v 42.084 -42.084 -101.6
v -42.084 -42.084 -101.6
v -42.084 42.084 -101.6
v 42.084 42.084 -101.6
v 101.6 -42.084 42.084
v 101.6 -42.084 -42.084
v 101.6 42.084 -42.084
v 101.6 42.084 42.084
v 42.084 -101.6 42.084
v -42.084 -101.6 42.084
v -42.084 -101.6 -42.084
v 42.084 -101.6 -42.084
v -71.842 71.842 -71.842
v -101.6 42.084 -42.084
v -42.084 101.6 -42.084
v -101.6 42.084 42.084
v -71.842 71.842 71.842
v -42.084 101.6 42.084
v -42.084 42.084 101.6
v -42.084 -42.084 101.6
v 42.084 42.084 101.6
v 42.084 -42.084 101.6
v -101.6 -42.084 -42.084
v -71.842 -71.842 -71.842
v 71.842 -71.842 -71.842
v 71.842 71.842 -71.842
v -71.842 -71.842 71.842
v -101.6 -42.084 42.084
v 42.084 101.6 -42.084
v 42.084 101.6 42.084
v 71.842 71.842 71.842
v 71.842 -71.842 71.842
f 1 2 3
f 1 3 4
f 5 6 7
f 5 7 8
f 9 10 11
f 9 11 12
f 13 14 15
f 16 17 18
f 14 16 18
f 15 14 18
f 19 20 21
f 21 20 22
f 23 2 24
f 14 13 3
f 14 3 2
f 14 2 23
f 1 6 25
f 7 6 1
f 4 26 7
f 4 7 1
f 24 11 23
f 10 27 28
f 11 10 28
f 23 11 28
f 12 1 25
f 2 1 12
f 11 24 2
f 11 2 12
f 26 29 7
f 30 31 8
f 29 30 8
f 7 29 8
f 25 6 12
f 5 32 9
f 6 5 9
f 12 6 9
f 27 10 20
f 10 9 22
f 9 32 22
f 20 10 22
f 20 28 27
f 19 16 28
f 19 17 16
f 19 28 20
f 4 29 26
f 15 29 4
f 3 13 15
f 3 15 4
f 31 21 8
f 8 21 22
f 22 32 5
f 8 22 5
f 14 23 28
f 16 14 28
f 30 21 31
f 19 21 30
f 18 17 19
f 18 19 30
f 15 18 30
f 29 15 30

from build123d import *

# Parameters (mm, degrees)
F0_W     = 203.2
F0_H     = 203.2
F1_DEPTH = 101.6
F3_DEPTH = 203.2
F5_DEPTH = 101.6
F7_DEPTH = 101.6


with BuildPart() as f1:
    # F0 (on Front) → F1 (new body, symmetric)
    with BuildSketch(Plane.XZ):
        Rectangle(F0_W, F0_H)
    extrude(amount=F1_DEPTH, both=True)

    # F2 (on face) → F3 (cut)
    with BuildSketch(Plane.XY.offset(101.6)):
        Polygon((-101.6, 42.084098), (-42.084098, 101.6), (-101.6, 101.6), align=None)
        Polygon((101.6, 101.6), (42.084098, 101.6), (101.6, 42.084098), align=None)
        Polygon((101.6, -101.6), (101.6, -42.084098), (42.084098, -101.6), align=None)
        Polygon((-42.084098, -101.6), (-101.6, -42.084098), (-101.6, -101.6), align=None)
    extrude(amount=-F3_DEPTH, mode=Mode.SUBTRACT)

    # F4 (on Front) → F5 (cut, symmetric)
    with BuildSketch(Plane.XZ):
        Polygon((-101.6, 42.084098), (-42.084098, 101.6), (-101.6, 101.6), align=None)
        Polygon((-101.6, -101.6), (-42.084098, -101.6), (-101.6, -42.084098), align=None)
        Polygon((101.6, -101.6), (101.6, -42.084098), (42.084098, -101.6), align=None)
        Polygon((101.6, 101.6), (42.084098, 101.6), (101.6, 42.084098), align=None)
    extrude(amount=F5_DEPTH, both=True, mode=Mode.SUBTRACT)

    # F6 (on Right) → F7 (cut, symmetric)
    with BuildSketch(Plane.YZ):
        Polygon((101.6, 101.6), (42.084098, 101.6), (101.6, 42.084098), align=None)
        Polygon((101.6, -101.6), (101.6, -42.084098), (42.084098, -101.6), align=None)
        Polygon((-101.6, -101.6), (-42.084098, -101.6), (-101.6, -42.084098), align=None)
        Polygon((-101.6, 42.084098), (-42.084098, 101.6), (-101.6, 101.6), align=None)
    extrude(amount=F7_DEPTH, both=True, mode=Mode.SUBTRACT)


solid = f1.part
